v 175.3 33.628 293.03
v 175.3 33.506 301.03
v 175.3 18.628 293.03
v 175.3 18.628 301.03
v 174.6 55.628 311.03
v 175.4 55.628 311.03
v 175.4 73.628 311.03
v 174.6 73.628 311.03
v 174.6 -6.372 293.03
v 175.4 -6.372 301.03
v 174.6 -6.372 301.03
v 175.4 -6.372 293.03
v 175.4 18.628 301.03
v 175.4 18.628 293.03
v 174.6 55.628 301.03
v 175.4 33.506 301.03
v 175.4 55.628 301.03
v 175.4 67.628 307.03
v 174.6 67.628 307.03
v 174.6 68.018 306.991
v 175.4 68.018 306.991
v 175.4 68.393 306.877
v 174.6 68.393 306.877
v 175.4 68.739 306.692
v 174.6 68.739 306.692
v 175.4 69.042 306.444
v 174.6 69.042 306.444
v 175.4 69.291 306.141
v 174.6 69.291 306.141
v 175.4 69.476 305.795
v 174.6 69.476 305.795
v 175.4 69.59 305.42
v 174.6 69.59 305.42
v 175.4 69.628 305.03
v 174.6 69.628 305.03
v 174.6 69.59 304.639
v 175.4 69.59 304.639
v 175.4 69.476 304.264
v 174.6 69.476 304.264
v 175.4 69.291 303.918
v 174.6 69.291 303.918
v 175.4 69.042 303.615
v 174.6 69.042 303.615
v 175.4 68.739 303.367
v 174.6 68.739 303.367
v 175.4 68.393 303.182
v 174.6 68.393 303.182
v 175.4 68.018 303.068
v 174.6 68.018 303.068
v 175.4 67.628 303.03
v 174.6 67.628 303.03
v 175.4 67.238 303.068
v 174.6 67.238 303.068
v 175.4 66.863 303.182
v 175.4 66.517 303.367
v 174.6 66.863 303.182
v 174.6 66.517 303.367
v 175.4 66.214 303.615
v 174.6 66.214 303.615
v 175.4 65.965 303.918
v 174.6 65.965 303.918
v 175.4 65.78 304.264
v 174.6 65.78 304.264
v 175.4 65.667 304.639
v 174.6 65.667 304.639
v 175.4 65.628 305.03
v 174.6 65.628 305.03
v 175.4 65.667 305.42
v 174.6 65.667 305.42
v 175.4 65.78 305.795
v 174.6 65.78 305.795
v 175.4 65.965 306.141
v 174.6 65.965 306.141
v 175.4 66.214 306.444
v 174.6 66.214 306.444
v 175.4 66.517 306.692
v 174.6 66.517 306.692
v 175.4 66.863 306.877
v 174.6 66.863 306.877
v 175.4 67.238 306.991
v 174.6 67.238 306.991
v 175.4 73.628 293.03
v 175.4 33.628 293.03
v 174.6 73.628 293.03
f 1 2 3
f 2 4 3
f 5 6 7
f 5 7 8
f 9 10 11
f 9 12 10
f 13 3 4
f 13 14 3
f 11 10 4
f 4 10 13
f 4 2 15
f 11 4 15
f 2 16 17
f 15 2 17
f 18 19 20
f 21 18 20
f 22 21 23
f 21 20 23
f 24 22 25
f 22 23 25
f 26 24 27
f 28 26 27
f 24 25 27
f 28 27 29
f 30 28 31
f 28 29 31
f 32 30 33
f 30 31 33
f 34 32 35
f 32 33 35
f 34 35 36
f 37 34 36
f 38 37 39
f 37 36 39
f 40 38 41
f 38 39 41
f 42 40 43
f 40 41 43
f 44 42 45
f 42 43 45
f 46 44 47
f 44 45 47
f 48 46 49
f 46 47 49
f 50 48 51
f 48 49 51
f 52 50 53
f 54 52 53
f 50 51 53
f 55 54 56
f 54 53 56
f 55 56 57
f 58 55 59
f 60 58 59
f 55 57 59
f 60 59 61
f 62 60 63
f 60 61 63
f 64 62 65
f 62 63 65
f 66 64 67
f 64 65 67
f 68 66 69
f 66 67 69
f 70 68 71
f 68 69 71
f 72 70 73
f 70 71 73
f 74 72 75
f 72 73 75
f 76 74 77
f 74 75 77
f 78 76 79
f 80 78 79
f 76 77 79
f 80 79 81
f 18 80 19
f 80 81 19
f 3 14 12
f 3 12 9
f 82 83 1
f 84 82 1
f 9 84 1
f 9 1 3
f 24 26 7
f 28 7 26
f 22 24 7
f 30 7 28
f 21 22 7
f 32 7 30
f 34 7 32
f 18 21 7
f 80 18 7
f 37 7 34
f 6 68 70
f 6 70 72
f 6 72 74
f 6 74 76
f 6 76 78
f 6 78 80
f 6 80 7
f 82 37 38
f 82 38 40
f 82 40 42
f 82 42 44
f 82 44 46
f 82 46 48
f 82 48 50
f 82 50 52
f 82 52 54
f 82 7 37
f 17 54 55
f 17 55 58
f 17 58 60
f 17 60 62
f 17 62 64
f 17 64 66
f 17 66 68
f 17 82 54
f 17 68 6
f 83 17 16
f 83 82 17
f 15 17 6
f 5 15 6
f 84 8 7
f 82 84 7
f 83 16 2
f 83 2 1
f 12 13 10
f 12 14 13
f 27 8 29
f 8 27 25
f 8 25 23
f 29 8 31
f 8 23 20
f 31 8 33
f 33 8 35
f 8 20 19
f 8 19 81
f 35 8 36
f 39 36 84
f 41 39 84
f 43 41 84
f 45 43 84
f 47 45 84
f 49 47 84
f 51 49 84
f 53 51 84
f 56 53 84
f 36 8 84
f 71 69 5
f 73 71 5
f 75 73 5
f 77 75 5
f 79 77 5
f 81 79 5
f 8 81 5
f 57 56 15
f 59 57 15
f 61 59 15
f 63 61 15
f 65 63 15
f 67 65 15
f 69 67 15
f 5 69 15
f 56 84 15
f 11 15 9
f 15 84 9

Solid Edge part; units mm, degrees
sketch "Sketch1" plane through (0, 0, 293.0295) normal (0, 0, 1) x (1, 0, 0)
  line L0 (175.4, 73.6281) -> (175.4, -6.3719)
  line L1 (175.4, -6.3719) -> (174.6, -6.3719)
  line L2 (174.6, 73.6281) -> (174.6, -6.3719)
  line L3 (174.6, 73.6281) -> (175.4, 73.6281)
extrude "Protrusion1" add sketch "Sketch1" along normal blind 18
sketch "Sketch2" plane through (174.6, 56.2359, 300.5295) normal (-1, 0, 0) x (0, 0, 1)
  circle A0 centre (4.5, 11.3922) radius 2
  line L0 (10.5, -70.6078) -> (0.5, -70.6078)
  line L1 (0.5, -70.6078) -> (0.5, -0.6078)
  line L2 (0.5, -0.6078) -> (10.5, -0.6078)
  line L3 (10.5, -0.6078) -> (10.5, -70.6078)
  dimension "D1" = 6
  dimension "D2" = 6
  dimension "D3" = 70
  dimension "D4" = 18
  dimension "D5" = 10
extrude "Cutout1" cut sketch "Sketch2" along normal through all and the other way through all
sketch "Sketch3" plane through (175.4, 33.6281, 302.0295) normal (1, 0, 0) x (0, 1, 0)
  line L0 (0, -9) -> (-15, -9)
  line L1 (-15, -9) -> (-15, -1)
  line L2 (-15, -1) -> (-0.1222, -1)
  line L3 (-0.1222, -1) -> (0, -9)
extrude "ExtrudedCutout_2" cut sketch "Sketch3" against normal blind 0.1
